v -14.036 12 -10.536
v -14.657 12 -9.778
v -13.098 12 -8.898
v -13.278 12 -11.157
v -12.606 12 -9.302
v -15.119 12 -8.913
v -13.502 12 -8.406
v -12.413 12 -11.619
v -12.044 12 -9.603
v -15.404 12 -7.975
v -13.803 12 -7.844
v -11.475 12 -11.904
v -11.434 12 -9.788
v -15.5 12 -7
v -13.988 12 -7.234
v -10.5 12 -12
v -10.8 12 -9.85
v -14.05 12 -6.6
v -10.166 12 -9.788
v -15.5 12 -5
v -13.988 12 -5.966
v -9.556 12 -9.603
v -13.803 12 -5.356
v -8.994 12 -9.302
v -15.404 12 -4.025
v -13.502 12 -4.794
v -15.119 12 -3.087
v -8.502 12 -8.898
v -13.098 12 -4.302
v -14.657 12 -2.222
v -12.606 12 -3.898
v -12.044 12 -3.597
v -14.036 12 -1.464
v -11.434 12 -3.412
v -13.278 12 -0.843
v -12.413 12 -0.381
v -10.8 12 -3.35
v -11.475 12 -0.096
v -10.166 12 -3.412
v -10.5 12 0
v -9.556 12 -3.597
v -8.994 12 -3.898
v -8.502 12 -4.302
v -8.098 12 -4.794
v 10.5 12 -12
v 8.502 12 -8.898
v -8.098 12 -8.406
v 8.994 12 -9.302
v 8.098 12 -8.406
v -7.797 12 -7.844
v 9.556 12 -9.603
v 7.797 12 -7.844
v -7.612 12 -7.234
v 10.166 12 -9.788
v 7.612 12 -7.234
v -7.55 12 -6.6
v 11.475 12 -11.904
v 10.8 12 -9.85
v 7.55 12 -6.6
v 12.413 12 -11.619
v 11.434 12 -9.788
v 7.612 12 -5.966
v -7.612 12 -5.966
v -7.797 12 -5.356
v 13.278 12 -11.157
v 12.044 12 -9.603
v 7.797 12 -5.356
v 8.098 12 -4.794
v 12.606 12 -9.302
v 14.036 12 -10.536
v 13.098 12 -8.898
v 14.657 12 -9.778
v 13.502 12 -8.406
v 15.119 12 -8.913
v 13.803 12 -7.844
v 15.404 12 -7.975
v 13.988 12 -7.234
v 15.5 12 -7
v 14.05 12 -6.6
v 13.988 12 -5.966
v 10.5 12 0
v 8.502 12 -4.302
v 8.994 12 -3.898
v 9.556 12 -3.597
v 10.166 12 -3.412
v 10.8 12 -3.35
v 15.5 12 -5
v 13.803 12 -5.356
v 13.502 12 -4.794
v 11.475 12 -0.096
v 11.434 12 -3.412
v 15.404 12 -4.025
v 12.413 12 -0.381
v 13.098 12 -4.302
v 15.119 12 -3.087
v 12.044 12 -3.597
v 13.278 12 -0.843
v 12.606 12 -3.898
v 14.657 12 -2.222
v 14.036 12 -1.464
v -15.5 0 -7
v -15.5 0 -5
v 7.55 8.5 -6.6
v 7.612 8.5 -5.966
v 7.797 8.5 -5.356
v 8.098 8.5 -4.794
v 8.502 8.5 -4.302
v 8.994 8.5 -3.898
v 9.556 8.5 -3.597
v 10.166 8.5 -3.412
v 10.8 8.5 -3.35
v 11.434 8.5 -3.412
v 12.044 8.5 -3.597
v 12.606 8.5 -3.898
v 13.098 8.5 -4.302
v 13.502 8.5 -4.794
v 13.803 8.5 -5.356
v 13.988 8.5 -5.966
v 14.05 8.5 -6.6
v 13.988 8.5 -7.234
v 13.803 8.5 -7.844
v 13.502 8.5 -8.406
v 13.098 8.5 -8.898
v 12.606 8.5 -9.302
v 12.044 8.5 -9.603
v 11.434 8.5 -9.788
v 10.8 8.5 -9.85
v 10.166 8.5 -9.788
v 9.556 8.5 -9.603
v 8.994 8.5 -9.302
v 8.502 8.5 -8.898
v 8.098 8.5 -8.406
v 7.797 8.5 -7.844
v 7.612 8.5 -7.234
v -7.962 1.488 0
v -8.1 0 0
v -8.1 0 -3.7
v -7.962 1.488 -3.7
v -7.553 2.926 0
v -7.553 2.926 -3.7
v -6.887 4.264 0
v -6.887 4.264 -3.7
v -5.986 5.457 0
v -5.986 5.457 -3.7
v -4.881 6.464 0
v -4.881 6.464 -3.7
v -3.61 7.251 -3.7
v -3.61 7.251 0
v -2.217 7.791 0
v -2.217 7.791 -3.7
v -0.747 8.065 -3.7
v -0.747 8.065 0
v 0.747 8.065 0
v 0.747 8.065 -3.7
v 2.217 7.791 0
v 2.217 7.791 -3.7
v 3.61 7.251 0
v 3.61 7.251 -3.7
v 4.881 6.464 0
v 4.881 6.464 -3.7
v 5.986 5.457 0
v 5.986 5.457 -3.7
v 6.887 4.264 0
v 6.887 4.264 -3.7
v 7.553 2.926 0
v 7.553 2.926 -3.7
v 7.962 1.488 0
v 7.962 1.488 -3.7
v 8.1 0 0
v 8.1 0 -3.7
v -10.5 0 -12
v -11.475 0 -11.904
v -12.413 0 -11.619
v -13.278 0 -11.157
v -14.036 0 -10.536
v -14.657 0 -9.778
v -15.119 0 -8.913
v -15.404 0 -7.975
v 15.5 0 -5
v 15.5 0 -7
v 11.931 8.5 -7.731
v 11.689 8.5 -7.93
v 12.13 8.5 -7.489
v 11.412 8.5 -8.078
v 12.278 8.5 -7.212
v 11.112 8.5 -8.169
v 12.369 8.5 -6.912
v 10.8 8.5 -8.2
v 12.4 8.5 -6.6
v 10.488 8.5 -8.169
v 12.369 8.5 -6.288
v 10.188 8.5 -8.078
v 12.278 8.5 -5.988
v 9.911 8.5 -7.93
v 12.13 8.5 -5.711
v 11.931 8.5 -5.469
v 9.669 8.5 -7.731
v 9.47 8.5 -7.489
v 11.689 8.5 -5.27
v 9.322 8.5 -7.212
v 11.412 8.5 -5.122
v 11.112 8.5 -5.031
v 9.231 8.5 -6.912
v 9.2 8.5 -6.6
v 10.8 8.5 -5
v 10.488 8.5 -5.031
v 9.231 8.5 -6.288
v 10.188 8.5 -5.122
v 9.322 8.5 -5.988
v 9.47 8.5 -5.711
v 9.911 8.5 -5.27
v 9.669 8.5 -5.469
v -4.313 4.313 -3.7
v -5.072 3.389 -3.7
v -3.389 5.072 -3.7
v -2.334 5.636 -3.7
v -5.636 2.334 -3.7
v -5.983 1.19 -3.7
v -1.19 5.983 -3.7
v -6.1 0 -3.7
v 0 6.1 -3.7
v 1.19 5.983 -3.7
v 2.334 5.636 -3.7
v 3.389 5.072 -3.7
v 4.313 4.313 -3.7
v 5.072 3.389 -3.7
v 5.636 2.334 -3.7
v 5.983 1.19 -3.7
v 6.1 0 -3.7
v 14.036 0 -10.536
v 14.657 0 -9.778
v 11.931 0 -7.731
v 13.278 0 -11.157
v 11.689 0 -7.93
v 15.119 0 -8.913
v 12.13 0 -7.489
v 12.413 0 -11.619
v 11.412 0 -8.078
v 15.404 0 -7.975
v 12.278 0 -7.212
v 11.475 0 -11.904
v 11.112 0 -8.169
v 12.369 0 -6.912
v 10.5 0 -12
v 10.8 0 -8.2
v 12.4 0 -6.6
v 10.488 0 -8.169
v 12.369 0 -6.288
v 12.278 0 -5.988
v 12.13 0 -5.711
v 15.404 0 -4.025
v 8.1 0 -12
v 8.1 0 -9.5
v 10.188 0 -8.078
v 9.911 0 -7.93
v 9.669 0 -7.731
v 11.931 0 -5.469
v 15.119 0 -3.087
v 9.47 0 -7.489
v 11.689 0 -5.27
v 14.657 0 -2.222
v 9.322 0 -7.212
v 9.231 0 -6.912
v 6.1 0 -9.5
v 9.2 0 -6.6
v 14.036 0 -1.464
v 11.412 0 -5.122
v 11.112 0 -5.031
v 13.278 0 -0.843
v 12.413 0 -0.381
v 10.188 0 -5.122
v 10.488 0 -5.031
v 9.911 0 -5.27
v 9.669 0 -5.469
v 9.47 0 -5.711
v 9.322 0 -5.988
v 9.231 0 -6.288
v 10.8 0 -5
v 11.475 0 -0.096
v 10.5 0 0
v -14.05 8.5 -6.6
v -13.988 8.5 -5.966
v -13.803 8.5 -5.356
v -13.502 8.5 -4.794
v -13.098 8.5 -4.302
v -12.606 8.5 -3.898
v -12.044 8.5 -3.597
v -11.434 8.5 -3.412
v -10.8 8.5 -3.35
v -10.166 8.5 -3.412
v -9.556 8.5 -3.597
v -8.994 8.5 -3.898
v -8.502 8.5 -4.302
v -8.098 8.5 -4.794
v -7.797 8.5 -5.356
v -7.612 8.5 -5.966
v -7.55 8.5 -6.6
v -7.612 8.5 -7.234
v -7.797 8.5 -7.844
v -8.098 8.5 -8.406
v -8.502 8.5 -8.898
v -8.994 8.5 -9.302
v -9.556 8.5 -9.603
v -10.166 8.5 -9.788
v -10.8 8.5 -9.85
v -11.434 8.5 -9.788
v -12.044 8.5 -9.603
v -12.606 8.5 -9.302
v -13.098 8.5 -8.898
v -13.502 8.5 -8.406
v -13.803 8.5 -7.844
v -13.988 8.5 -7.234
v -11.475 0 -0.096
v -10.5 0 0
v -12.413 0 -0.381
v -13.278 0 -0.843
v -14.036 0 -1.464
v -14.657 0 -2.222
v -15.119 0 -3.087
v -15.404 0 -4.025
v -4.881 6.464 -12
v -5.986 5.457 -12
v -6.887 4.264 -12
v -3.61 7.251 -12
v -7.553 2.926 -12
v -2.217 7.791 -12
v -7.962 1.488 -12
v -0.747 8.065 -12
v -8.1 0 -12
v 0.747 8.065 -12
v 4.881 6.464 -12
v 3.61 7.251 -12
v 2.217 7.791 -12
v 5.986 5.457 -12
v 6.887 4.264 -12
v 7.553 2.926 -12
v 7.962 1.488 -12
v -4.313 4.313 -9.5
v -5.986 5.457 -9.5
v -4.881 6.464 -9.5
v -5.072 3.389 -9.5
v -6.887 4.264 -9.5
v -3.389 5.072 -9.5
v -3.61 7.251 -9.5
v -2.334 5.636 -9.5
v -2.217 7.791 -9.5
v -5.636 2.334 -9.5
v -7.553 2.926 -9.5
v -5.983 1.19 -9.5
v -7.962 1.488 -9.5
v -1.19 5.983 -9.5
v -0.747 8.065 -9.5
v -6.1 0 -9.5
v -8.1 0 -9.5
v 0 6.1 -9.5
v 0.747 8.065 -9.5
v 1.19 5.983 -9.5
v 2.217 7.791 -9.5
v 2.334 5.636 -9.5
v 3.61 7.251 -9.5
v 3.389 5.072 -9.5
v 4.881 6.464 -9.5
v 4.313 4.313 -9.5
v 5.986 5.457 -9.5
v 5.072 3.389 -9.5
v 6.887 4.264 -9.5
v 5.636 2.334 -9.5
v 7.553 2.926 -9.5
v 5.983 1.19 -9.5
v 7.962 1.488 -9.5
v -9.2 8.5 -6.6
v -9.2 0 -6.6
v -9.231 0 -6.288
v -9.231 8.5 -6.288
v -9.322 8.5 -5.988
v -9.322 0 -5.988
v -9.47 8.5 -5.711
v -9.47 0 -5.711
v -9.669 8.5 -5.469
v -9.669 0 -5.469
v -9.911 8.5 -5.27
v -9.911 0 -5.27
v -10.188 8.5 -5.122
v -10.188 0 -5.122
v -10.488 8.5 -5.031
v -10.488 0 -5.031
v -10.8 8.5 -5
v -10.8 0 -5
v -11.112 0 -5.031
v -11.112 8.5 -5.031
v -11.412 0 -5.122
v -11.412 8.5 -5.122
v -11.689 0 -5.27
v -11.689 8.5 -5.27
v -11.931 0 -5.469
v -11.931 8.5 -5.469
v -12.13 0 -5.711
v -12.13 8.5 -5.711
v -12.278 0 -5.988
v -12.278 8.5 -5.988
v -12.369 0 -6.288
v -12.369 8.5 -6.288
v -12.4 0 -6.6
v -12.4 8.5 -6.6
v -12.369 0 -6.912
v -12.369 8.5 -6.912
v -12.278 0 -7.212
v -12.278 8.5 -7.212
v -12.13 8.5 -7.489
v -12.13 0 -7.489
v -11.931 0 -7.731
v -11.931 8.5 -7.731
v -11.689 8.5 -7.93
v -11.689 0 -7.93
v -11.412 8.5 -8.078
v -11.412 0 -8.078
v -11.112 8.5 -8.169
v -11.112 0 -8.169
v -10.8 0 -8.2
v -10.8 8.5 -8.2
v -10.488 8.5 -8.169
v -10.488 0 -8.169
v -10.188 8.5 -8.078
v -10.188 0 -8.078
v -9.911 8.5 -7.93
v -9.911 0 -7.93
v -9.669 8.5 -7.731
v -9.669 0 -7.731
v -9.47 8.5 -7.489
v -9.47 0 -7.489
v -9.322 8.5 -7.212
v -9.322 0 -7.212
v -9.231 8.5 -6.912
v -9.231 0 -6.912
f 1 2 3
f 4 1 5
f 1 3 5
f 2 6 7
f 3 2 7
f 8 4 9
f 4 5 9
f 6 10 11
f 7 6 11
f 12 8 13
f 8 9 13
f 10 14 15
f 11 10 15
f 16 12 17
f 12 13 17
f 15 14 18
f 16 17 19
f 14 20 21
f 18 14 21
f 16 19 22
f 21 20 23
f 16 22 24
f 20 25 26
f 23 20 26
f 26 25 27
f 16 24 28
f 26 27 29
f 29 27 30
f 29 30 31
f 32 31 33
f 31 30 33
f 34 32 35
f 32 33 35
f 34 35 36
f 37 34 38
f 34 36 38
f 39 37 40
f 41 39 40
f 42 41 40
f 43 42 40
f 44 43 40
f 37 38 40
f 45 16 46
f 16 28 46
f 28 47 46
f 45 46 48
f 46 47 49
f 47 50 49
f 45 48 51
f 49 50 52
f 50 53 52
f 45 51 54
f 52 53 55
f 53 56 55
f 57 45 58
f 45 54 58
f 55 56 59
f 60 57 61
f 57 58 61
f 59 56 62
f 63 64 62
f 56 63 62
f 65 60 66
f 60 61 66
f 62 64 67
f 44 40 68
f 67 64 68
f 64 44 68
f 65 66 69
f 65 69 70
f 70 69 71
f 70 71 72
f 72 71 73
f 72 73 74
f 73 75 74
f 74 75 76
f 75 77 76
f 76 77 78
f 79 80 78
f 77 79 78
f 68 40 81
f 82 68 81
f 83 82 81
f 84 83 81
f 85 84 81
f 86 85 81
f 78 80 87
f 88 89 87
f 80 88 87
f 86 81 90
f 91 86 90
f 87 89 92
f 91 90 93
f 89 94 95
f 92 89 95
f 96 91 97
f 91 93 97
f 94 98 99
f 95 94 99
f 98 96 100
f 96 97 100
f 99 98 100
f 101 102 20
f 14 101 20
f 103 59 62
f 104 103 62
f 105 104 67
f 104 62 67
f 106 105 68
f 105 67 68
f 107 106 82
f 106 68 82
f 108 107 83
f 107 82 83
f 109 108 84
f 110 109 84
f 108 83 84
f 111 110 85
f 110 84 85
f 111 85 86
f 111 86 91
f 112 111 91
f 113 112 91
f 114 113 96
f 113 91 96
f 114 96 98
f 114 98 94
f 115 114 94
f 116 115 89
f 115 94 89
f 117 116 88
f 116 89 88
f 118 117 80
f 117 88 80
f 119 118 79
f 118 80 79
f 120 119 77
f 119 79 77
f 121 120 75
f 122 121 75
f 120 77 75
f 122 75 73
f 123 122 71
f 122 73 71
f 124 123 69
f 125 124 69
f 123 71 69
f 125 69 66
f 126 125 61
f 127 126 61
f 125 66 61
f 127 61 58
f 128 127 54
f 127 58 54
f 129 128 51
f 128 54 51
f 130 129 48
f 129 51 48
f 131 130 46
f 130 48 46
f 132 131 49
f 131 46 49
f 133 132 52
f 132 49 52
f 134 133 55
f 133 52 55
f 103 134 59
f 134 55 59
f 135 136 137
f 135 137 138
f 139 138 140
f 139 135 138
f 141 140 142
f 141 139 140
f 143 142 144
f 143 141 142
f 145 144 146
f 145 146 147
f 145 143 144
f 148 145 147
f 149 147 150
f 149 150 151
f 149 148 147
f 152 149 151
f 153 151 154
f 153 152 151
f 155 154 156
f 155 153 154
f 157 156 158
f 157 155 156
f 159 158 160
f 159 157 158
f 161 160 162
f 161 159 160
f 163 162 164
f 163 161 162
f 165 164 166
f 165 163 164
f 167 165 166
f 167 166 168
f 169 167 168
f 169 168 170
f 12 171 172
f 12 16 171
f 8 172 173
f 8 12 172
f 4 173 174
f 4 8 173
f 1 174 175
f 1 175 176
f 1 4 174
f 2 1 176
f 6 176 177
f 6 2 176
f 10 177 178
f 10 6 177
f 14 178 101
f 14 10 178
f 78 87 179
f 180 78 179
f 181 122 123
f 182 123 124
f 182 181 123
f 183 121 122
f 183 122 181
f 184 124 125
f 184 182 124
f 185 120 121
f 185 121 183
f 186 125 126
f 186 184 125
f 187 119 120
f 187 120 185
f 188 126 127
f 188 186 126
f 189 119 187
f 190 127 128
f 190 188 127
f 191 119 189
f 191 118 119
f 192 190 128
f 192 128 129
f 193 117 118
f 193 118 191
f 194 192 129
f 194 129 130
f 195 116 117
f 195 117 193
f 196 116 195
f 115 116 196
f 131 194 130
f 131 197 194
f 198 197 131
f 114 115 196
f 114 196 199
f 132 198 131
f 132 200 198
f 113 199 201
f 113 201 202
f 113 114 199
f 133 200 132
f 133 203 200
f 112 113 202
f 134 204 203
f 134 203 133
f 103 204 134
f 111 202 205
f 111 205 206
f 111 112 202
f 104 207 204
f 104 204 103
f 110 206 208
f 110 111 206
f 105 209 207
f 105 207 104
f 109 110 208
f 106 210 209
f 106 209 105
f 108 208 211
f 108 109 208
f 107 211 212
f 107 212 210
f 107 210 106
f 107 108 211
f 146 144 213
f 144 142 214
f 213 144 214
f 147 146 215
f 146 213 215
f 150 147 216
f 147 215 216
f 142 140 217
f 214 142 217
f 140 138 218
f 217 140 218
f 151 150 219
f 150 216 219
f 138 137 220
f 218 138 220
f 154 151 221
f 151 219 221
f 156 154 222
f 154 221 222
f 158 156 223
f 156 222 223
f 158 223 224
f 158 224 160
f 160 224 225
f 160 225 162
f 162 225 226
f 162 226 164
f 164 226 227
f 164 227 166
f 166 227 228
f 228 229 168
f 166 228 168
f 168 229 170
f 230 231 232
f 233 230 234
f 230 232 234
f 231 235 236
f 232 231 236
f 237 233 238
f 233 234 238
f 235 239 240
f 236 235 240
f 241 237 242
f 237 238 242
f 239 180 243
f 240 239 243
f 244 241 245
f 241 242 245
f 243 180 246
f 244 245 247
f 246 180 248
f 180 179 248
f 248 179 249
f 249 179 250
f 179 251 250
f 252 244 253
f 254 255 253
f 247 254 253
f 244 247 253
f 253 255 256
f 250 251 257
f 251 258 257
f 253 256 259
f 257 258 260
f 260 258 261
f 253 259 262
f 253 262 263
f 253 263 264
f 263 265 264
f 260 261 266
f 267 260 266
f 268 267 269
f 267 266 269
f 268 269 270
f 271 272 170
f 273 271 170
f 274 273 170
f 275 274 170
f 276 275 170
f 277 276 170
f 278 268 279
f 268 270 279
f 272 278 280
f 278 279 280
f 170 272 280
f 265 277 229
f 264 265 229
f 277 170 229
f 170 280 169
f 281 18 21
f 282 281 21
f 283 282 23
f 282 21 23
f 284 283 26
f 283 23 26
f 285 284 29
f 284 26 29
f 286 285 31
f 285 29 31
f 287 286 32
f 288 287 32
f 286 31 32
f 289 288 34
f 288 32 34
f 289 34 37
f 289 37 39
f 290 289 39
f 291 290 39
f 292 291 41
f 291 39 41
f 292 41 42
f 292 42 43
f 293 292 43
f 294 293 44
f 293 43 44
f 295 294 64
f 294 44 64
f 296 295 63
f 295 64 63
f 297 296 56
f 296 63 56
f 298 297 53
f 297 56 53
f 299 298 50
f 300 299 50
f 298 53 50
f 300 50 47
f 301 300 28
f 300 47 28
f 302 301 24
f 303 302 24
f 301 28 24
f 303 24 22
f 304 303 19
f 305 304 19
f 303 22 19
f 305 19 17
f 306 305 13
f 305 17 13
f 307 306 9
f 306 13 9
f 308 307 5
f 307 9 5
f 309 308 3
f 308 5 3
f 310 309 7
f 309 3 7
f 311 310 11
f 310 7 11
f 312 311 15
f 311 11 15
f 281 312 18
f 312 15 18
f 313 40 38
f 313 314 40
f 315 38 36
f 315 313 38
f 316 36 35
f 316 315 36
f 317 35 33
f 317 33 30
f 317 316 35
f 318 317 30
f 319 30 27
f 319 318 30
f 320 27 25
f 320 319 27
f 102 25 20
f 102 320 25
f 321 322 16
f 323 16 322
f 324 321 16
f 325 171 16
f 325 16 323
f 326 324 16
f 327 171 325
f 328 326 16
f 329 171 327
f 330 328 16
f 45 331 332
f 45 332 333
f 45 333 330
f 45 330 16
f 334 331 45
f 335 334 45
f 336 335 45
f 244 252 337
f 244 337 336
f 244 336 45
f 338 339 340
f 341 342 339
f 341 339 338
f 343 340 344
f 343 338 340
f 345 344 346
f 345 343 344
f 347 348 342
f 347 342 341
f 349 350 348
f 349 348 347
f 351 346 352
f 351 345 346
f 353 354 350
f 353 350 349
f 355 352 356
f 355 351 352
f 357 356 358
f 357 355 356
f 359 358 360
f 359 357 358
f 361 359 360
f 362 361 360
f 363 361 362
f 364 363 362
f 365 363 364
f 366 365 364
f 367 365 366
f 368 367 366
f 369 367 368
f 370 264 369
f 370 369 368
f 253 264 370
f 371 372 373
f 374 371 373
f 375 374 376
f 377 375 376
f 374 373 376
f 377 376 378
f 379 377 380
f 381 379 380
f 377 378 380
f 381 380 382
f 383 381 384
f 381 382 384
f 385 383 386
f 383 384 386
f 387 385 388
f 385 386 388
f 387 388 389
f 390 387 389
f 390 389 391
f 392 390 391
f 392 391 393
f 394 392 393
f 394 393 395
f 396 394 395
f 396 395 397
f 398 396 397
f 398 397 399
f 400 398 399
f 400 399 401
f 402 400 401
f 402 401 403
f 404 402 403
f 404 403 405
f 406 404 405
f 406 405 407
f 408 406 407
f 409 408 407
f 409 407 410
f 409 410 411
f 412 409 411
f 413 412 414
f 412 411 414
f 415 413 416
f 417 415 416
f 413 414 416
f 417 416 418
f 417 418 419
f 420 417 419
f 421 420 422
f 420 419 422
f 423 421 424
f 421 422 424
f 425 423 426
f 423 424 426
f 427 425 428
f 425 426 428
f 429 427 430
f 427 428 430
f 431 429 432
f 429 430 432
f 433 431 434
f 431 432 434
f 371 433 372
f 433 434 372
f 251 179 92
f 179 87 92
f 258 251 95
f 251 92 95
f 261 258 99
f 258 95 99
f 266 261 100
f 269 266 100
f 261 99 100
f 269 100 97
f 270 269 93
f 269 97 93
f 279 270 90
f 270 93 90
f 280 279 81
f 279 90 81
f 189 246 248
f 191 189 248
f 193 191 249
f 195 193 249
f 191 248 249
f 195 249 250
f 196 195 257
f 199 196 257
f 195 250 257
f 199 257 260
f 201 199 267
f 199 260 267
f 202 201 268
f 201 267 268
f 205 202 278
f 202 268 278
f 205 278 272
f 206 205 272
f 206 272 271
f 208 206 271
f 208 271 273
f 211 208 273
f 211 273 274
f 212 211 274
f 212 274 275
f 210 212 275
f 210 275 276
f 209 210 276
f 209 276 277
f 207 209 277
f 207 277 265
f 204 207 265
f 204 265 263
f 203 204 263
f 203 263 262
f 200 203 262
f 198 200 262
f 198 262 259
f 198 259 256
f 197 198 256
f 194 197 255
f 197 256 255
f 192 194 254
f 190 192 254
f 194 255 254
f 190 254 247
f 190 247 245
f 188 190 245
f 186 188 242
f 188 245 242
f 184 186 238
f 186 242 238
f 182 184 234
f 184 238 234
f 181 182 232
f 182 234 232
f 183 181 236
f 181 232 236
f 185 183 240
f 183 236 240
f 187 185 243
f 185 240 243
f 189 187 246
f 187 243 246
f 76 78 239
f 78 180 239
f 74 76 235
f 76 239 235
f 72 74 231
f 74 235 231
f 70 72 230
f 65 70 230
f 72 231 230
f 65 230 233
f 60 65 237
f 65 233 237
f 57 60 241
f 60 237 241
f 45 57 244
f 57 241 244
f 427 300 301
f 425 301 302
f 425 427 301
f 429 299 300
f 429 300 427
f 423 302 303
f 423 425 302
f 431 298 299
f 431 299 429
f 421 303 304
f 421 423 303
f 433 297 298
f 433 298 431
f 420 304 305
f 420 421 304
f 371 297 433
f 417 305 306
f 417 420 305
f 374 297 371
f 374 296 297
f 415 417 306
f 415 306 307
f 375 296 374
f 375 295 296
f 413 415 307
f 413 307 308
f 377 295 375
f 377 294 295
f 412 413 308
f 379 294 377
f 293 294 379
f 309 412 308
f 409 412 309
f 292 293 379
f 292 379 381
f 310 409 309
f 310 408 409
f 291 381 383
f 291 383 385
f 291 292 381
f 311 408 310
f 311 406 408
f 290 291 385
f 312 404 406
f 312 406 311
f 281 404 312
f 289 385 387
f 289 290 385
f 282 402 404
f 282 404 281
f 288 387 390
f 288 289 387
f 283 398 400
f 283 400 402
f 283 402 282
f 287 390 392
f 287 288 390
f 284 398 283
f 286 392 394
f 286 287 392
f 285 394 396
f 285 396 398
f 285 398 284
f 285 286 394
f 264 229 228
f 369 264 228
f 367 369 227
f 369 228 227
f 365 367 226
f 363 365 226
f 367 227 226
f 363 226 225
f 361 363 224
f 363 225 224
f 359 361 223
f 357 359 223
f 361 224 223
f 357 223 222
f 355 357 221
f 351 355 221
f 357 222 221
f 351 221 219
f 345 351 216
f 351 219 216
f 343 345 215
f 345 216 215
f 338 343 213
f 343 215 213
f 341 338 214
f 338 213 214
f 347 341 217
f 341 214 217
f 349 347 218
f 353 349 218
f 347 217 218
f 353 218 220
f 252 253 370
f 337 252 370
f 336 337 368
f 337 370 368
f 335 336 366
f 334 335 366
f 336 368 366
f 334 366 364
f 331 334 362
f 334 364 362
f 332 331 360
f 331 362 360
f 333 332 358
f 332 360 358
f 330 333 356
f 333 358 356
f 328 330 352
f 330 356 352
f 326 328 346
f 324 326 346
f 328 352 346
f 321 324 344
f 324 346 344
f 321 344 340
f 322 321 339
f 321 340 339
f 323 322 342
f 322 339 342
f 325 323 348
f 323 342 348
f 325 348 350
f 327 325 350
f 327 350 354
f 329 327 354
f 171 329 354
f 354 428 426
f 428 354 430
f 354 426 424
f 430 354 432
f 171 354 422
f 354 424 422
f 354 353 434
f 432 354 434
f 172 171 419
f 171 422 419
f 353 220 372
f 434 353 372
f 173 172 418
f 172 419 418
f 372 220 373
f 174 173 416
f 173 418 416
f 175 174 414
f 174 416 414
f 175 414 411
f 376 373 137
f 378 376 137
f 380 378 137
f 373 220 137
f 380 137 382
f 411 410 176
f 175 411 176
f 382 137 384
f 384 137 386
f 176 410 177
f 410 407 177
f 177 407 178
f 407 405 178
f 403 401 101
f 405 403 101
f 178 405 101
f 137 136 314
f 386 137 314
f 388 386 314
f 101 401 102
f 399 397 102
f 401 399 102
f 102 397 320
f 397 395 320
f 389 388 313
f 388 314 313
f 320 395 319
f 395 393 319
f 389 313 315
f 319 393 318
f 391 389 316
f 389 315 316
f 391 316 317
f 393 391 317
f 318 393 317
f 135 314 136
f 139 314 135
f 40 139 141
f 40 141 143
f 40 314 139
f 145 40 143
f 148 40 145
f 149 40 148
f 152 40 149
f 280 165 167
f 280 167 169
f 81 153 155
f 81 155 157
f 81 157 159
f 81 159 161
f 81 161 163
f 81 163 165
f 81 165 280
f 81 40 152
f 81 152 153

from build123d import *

# Parameters (mm, degrees)
F1_DEPTH = 3.7
F3_DEPTH = 5.8
F5_DEPTH = 2.5
F6_R     = 1.6
F7_DEPTH = 12.001
F8_R     = 3.25
F9_DEPTH = 3.5
F10_R    = 5


with BuildPart() as f1:
    # F0 (on Top) → F1 (new body)
    with BuildSketch(Plane.XY):
        with BuildLine():
            Line((15.5, 12), (-15.5, 12))
            Line((-15.5, 12), (-15.5, 0))
            Line((-15.5, 0), (-8.1, 0))
            ThreePointArc((-8.1, 0), (0, 8.1), (8.1, 0))
            Line((8.1, 0), (15.5, 0))
            Line((15.5, 0), (15.5, 12))
        make_face()
    extrude(amount=-F1_DEPTH)

    # F2 (on face) → F3 (join)
    with BuildSketch(Plane(origin=(0, 0, -3.7), x_dir=(1, 0, 0), z_dir=(0, 0, -1))):
        with BuildLine():
            Line((0, -12), (15.5, -12))
            Line((15.5, -12), (15.5, 0))
            Line((15.5, 0), (6.1, 0))
            ThreePointArc((6.1, 0), (0, -6.1), (-6.1, 0))
            Line((-6.1, 0), (-8.1, 0))
            Line((-8.1, 0), (-15.5, 0))
            Line((-15.5, 0), (-15.5, -12))
            Line((-15.5, -12), (0, -12))
        make_face()
    extrude(amount=F3_DEPTH)

    # F4 (on face) → F5 (join)
    with BuildSketch(Plane(origin=(0, 0, -9.5), x_dir=(1, 0, 0), z_dir=(0, 0, -1))):
        with BuildLine():
            Line((15.5, 0), (8.1, 0))
            ThreePointArc((8.1, 0), (0, -8.1), (-8.1, 0))
            Line((-8.1, 0), (-15.5, 0))
            Line((-15.5, 0), (-15.5, -12))
            Line((-15.5, -12), (15.5, -12))
            Line((15.5, -12), (15.5, 0))
        make_face()
    extrude(amount=F5_DEPTH)

    # F6 (on face) → F7 (cut, through all)
    with BuildSketch(Plane.XZ):
        with Locations((-10.8, -6.6)):
            Circle(F6_R)
        with Locations((10.8, -6.6)):
            Circle(F6_R)
    extrude(amount=-F7_DEPTH, mode=Mode.SUBTRACT)

    # F8 (on face) → F9 (cut)
    with BuildSketch(Plane(origin=(0, 12, 0), x_dir=(-1, 0, 0), z_dir=(0, 1, 0))):
        with Locations((-10.8, -6.6)):
            Circle(F8_R)
        with Locations((10.8, -6.6)):
            Circle(F8_R)
    extrude(amount=-F9_DEPTH, mode=Mode.SUBTRACT)

    # F10
    f10_edges = [f1.edges().sort_by_distance(p)[0] for p in [
        (15.5, 6, 0),
        (15.5, 6, -12),
        (-15.5, 6, 0),
        (-15.5, 6, -12),
    ]]
    fillet(f10_edges, radius=F10_R)


solid = f1.part
